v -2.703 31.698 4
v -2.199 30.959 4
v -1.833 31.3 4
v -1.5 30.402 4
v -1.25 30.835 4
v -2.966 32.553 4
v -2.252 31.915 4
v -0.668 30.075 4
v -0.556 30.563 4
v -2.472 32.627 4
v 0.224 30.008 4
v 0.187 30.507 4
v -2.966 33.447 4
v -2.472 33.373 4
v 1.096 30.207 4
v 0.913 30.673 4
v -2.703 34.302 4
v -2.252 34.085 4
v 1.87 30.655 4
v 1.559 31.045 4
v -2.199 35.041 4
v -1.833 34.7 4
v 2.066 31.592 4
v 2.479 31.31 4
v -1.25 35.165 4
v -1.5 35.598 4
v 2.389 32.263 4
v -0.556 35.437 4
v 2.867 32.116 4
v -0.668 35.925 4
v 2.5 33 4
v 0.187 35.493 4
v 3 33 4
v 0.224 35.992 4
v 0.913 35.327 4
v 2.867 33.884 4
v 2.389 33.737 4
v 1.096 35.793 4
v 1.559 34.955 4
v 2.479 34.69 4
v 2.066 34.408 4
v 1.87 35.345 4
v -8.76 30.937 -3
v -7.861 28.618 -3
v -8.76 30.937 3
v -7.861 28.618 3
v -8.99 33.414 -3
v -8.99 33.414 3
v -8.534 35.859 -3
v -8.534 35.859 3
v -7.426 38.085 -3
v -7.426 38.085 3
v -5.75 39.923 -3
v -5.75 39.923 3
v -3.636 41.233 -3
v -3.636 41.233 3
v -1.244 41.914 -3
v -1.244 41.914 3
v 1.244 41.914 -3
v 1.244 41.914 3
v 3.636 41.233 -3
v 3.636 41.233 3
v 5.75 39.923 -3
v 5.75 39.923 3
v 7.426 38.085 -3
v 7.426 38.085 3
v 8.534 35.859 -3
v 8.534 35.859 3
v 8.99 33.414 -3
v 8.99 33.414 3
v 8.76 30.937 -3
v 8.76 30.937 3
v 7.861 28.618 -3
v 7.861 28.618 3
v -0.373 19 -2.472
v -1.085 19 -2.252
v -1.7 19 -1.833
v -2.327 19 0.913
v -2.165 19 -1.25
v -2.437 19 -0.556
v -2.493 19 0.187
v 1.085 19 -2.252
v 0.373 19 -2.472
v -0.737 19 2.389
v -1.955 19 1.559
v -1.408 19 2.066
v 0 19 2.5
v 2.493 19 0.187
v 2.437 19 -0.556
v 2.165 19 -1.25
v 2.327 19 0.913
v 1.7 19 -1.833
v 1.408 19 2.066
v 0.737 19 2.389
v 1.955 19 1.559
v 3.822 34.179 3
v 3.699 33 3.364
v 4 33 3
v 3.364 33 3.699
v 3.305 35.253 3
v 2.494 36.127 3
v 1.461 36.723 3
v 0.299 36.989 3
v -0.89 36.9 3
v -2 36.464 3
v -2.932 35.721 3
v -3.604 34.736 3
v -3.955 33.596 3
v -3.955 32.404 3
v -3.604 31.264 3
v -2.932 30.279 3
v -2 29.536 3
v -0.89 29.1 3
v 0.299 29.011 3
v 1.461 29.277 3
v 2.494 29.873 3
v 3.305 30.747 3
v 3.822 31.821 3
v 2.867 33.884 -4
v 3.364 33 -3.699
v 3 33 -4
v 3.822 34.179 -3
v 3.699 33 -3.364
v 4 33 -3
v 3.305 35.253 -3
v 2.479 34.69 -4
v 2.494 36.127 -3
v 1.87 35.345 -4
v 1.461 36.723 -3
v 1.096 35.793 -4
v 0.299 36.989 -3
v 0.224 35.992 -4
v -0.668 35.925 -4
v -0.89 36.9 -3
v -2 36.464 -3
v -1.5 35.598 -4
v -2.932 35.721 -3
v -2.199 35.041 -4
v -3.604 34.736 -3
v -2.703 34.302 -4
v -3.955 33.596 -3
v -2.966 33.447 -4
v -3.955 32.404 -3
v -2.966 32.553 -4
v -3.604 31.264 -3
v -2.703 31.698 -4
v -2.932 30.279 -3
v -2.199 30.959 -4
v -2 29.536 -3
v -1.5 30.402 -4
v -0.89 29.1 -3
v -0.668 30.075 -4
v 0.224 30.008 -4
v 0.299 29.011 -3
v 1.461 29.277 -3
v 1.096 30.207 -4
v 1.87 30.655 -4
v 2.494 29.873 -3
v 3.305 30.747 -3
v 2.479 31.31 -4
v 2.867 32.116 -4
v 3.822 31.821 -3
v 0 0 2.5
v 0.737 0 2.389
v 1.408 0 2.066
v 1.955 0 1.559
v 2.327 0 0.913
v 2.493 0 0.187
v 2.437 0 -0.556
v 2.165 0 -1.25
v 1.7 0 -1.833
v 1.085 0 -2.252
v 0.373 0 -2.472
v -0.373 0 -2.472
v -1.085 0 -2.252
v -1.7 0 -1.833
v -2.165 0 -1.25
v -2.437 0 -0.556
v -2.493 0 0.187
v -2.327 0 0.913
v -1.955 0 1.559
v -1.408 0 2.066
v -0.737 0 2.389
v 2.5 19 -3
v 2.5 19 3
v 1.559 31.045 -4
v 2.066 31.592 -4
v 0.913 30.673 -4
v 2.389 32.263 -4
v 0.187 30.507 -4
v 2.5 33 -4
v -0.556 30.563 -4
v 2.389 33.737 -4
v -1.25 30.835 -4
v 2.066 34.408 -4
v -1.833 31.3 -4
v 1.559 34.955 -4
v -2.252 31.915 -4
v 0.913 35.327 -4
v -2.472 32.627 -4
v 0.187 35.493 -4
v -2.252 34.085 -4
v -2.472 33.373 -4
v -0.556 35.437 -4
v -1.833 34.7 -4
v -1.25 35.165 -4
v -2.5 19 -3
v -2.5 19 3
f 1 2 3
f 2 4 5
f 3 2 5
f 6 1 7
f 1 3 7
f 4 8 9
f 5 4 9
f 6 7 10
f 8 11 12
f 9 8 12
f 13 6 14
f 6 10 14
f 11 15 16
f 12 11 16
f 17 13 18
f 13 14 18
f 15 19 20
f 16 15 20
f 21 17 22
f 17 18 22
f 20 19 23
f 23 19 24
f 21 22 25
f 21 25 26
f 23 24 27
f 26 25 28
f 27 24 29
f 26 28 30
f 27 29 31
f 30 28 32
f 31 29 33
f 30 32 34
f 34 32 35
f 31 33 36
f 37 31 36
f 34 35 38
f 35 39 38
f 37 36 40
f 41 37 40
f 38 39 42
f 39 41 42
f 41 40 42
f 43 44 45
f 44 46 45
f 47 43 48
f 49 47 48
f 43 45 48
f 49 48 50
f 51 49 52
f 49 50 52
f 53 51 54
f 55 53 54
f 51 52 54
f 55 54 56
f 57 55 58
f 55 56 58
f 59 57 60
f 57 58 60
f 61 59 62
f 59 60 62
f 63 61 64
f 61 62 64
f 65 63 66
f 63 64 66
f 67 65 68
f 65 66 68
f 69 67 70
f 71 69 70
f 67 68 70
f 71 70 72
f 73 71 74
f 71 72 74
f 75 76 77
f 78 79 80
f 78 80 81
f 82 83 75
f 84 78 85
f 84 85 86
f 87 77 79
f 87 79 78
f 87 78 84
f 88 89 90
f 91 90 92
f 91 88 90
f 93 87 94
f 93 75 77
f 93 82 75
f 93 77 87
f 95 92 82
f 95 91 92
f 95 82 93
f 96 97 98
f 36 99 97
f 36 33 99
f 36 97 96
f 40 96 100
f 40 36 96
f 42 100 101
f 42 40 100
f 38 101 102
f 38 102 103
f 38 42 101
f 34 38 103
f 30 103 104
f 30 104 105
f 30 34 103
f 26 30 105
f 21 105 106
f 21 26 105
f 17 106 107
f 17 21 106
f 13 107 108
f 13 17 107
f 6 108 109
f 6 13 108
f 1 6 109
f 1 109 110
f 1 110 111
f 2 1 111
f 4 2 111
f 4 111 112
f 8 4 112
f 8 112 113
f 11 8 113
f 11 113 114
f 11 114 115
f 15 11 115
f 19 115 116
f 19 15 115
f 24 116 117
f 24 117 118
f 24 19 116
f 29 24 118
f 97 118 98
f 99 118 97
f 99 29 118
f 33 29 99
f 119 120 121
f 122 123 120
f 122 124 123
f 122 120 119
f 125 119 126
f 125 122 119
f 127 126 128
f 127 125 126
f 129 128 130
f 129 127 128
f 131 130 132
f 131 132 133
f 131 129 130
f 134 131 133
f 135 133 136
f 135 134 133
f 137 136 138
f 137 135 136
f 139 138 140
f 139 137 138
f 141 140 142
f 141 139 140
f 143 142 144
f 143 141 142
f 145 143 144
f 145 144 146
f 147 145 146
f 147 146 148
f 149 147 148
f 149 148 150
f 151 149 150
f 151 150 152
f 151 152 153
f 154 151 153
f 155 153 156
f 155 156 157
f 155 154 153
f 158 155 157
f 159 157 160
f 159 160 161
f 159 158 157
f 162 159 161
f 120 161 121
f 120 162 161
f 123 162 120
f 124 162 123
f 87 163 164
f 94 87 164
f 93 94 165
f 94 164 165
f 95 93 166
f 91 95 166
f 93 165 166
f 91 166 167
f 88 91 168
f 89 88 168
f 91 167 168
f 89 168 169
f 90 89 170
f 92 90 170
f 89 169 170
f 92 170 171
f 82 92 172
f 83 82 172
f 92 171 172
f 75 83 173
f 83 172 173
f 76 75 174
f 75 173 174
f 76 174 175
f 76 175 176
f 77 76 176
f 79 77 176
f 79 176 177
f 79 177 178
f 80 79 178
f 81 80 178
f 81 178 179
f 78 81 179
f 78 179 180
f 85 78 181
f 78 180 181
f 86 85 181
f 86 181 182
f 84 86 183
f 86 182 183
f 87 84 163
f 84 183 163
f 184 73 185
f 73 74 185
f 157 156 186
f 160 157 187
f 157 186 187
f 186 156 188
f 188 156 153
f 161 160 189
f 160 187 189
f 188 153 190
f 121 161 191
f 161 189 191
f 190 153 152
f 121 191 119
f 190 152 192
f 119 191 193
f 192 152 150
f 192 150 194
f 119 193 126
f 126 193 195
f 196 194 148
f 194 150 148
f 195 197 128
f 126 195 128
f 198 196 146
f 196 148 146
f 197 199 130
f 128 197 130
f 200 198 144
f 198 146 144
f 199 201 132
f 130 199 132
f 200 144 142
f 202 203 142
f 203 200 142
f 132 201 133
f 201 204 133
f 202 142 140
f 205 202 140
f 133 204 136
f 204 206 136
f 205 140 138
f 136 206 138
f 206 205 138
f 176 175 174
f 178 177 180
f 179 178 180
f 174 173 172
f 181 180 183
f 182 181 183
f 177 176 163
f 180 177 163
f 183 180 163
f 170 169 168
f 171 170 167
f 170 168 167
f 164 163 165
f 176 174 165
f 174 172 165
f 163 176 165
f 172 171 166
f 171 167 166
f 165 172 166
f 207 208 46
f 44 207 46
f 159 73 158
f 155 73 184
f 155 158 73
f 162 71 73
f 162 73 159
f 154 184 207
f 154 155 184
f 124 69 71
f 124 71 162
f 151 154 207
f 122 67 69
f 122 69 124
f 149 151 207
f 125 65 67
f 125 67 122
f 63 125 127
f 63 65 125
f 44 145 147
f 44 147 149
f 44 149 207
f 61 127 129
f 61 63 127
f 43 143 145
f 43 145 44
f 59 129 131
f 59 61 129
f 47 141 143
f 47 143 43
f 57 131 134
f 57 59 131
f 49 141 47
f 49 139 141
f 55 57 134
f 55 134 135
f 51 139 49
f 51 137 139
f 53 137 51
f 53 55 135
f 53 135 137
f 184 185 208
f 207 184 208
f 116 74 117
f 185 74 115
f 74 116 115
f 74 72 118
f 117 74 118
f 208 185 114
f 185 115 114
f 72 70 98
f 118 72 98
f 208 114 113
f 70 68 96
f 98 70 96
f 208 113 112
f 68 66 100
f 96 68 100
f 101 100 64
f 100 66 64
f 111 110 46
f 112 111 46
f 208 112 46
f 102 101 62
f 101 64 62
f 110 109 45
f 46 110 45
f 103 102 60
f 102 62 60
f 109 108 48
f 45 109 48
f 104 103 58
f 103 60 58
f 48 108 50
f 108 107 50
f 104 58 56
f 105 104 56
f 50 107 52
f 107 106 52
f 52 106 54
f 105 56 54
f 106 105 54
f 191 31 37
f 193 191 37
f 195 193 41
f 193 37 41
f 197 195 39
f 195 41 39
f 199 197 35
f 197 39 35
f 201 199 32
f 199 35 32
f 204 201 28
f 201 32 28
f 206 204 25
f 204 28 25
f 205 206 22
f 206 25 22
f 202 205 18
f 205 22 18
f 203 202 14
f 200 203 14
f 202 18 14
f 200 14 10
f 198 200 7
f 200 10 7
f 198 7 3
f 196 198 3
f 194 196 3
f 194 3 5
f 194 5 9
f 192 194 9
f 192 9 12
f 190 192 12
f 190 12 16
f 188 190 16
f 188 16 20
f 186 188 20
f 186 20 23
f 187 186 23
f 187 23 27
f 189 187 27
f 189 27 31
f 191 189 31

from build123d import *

# Parameters (mm, degrees)
SKETCH2_R           = 2.5
BOSS_EXTRUDE1_DEPTH = 19
BOSS_EXTRUDE2_DEPTH = 3
SKETCH7_W           = 10
SKETCH7_H           = 20
CUT_EXTRUDE2_DEPTH  = 5
SKETCH4_R           = 2.5
CUT_EXTRUDE1_DEPTH  = 44.69210455


# Read off the part's stored shape, not the designer's step: Sweep1
with BuildPart() as part:
    # Sketch2 → Boss-Extrude1 (new body)
    with BuildSketch(Plane(origin=(0, 0, 0), x_dir=(1, 0, 0), z_dir=(0, 1, 0))):
        with Locations(Location((0, 0, 0), (0, 0, 270))):
            Circle(SKETCH2_R)
    extrude(amount=BOSS_EXTRUDE1_DEPTH)


with BuildPart() as body_2:
    # Sketch3 → Boss-Extrude2 (new, symmetric)
    with BuildSketch(Plane.XY):
        with BuildLine():
            Line((-2.5, 19), (-7.861216709, 28.618074412))
            ThreePointArc((-7.861216709, 28.618074412), (0, 42), (7.861216709, 28.618074412))
            Line((7.861216709, 28.618074412), (2.5, 19))
            Line((2.5, 19), (-2.5, 19))
        make_face()
    extrude(amount=BOSS_EXTRUDE2_DEPTH, both=True)

    # Sweep1 outline → Sweep1 (revolve)
    with BuildSketch(Plane.XZ.offset(-33)):
        with BuildLine():
            Line((0, -2.999999996), (0, -5))
            ThreePointArc((0, -5), (2.23606798, -4.472135954), (4.000000003, -2.999999996))
            Line((4.000000003, -2.999999996), (0, -2.999999996))
        make_face()
        with BuildLine():
            Line((0, 2.999999996), (4.000000003, 2.999999996))
            ThreePointArc((4.000000003, 2.999999996), (2.23606798, 4.472135954), (0, 5))
            Line((0, 5), (0, 2.999999996))
        make_face()
    revolve(axis=Axis((0, 33, 0), (0, 0, 1)))

    # Sketch7 → Cut-Extrude2 (cut, symmetric)
    with BuildSketch(Plane(origin=(0, 0, 0), x_dir=(0, 0, -1), z_dir=(1, 0, 0))):
        with Locations((9, 33)):
            Rectangle(SKETCH7_W, SKETCH7_H)
        with Locations((-9, 33)):
            Rectangle(SKETCH7_W, SKETCH7_H)
    extrude(amount=CUT_EXTRUDE2_DEPTH, both=True, mode=Mode.SUBTRACT)

    # Sketch4 → Cut-Extrude1 (cut, through all)
    with BuildSketch(Plane.XY.offset(4)):
        with Locations((0, 33)):
            Circle(SKETCH4_R)
    extrude(amount=-CUT_EXTRUDE1_DEPTH, mode=Mode.SUBTRACT)


solid = Compound([part.part, body_2.part])
